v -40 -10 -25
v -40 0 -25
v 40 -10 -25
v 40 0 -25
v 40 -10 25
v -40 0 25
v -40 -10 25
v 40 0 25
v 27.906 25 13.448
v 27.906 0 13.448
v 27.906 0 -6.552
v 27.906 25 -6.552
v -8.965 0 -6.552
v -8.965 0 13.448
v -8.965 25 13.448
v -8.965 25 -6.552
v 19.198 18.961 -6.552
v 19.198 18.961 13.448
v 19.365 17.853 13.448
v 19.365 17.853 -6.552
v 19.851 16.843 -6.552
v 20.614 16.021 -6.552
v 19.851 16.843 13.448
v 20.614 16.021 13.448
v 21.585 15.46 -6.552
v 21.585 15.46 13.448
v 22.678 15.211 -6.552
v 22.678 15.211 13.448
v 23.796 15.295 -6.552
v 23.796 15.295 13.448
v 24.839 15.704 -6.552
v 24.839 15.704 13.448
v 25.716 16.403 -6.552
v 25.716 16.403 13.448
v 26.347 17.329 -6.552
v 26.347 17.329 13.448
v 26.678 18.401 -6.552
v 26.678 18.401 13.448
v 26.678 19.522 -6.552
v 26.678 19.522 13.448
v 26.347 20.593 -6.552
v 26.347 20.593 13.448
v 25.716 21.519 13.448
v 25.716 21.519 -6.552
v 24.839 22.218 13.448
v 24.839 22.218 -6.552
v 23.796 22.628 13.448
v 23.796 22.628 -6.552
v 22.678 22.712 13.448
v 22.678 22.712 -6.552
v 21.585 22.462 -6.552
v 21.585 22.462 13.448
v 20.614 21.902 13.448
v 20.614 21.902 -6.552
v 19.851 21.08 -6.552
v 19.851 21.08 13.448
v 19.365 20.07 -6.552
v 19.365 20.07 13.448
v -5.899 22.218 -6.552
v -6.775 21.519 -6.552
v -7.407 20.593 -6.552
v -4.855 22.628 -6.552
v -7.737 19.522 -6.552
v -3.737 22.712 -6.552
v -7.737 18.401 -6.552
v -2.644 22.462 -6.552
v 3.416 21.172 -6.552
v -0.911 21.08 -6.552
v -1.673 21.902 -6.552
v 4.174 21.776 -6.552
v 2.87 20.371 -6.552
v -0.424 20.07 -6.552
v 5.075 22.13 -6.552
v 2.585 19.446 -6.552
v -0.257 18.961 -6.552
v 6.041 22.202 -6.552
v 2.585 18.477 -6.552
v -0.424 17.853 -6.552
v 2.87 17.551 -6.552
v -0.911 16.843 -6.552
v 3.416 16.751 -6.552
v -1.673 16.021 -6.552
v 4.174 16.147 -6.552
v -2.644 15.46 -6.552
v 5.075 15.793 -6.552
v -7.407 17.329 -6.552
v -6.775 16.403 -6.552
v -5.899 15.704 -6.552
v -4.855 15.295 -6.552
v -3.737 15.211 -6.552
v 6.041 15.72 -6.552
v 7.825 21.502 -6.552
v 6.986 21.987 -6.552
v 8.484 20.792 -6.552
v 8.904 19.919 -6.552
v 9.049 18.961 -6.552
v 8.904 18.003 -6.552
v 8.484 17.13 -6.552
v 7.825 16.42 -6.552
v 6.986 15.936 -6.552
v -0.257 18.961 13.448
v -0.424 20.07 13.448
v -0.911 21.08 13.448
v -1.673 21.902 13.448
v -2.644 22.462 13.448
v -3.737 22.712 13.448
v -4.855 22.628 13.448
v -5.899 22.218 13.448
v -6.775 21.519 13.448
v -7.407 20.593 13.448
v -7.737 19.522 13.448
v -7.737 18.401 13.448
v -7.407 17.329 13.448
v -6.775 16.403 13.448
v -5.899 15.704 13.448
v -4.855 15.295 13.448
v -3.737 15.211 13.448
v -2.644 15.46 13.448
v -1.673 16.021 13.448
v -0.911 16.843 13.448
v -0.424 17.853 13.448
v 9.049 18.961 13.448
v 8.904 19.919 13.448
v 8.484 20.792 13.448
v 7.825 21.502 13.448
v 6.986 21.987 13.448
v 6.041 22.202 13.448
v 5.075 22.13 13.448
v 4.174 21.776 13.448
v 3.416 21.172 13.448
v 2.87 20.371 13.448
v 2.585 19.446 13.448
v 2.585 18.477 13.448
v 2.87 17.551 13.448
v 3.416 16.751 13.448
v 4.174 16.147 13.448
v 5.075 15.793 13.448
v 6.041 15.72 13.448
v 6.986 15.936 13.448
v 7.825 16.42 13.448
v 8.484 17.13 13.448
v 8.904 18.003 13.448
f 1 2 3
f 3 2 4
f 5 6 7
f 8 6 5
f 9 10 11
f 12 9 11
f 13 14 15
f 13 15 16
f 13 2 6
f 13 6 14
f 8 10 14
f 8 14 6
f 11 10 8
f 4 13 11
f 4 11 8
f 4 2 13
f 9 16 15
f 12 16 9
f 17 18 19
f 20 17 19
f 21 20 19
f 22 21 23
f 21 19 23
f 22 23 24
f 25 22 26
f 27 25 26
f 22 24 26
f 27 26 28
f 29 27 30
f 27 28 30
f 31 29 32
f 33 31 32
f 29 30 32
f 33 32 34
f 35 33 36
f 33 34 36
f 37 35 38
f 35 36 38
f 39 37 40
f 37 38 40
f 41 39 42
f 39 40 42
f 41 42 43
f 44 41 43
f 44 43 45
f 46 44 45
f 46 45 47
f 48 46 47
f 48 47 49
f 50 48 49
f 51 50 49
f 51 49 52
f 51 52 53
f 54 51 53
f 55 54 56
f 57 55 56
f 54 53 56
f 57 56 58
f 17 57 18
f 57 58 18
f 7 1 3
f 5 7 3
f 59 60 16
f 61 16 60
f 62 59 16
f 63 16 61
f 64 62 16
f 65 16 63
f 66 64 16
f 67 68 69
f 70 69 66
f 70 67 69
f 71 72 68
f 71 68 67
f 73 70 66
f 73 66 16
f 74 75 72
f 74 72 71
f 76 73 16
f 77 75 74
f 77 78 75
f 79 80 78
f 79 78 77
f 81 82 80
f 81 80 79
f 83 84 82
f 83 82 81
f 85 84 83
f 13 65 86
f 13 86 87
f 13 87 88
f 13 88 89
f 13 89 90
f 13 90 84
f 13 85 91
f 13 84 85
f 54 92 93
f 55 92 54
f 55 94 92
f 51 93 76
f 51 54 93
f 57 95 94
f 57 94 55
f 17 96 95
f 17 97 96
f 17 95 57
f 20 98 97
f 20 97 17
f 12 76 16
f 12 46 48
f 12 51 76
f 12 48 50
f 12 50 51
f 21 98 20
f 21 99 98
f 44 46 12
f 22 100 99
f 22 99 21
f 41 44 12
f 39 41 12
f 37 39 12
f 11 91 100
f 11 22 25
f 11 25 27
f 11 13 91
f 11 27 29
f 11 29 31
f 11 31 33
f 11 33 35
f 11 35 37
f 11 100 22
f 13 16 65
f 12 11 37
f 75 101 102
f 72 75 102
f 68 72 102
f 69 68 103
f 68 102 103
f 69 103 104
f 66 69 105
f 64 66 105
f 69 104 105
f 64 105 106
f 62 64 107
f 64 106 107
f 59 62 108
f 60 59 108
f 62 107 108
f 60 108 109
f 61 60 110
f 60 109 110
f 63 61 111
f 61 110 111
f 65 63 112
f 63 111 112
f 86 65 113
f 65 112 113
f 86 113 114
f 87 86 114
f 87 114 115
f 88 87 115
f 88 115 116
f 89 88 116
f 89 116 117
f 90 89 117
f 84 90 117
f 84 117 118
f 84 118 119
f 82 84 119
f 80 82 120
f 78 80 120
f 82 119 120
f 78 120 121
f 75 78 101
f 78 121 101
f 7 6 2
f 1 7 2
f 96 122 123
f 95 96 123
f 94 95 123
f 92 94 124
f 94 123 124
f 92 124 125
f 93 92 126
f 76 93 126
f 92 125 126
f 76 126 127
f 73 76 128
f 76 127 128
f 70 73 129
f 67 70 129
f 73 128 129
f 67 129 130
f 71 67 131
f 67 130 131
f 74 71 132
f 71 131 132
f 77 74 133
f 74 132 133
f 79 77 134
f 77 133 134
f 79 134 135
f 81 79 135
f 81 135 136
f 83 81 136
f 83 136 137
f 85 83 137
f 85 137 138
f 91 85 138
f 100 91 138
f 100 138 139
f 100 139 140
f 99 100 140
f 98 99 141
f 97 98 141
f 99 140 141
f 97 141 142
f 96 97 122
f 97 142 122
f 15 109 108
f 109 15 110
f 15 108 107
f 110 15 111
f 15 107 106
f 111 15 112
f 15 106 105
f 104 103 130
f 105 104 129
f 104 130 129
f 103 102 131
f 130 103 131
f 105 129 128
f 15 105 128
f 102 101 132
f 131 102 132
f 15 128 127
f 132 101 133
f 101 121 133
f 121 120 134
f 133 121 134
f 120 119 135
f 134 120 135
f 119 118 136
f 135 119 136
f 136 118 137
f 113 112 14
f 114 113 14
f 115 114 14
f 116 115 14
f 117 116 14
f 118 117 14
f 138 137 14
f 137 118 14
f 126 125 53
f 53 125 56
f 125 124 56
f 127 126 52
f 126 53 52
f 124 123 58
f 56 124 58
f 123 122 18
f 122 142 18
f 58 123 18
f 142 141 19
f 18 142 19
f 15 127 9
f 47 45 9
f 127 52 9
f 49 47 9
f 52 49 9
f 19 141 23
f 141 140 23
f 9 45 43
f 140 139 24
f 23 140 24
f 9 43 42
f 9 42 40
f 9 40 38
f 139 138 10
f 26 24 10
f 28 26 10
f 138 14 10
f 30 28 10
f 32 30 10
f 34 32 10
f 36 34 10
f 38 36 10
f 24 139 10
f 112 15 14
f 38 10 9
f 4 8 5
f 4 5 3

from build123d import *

# Parameters (mm, degrees)
SKETCH1_W           = 80
SKETCH1_H           = 50
MAIN_PLATE_DEPTH    = 10
SKETCH1_3_W         = 36.871622478
SKETCH1_3_H         = 20
BOSS_EXTRUDE2_DEPTH = 25
SKETCH2_R           = 3.760980907
SKETCH2_R_2         = 3.25
CUT_EXTRUDE1_DEPTH  = 20


with BuildPart() as part:
    # Sketch1 → Main Plate (new body)
    with BuildSketch(Plane(origin=(0, 0, 0), x_dir=(1, 0, 0), z_dir=(0, 1, 0))):
        Rectangle(SKETCH1_W, SKETCH1_H)
    extrude(amount=-MAIN_PLATE_DEPTH)

    # Sketch1<3> → Boss-Extrude2 (add)
    with BuildSketch(Plane(origin=(0, 0, 0), x_dir=(1, 0, 0), z_dir=(0, 1, 0))):
        with Locations((9.470325945, -3.44765343)):
            Rectangle(SKETCH1_3_W, SKETCH1_3_H)
    extrude(amount=BOSS_EXTRUDE2_DEPTH)

    # Sketch2 → Cut-Extrude1 (cut)
    with BuildSketch(Plane.XY.offset(13.44765343)):
        with Locations((-4.018286342, 18.961248544)):
            Circle(SKETCH2_R)
        with Locations(Location((22.958938232, 18.961248544, 0), (0, 0, 180))):
            Circle(SKETCH2_R)
        with Locations((5.79860133, 18.961248544)):
            Circle(SKETCH2_R_2)
    extrude(amount=-CUT_EXTRUDE1_DEPTH, mode=Mode.SUBTRACT)


solid = part.part
